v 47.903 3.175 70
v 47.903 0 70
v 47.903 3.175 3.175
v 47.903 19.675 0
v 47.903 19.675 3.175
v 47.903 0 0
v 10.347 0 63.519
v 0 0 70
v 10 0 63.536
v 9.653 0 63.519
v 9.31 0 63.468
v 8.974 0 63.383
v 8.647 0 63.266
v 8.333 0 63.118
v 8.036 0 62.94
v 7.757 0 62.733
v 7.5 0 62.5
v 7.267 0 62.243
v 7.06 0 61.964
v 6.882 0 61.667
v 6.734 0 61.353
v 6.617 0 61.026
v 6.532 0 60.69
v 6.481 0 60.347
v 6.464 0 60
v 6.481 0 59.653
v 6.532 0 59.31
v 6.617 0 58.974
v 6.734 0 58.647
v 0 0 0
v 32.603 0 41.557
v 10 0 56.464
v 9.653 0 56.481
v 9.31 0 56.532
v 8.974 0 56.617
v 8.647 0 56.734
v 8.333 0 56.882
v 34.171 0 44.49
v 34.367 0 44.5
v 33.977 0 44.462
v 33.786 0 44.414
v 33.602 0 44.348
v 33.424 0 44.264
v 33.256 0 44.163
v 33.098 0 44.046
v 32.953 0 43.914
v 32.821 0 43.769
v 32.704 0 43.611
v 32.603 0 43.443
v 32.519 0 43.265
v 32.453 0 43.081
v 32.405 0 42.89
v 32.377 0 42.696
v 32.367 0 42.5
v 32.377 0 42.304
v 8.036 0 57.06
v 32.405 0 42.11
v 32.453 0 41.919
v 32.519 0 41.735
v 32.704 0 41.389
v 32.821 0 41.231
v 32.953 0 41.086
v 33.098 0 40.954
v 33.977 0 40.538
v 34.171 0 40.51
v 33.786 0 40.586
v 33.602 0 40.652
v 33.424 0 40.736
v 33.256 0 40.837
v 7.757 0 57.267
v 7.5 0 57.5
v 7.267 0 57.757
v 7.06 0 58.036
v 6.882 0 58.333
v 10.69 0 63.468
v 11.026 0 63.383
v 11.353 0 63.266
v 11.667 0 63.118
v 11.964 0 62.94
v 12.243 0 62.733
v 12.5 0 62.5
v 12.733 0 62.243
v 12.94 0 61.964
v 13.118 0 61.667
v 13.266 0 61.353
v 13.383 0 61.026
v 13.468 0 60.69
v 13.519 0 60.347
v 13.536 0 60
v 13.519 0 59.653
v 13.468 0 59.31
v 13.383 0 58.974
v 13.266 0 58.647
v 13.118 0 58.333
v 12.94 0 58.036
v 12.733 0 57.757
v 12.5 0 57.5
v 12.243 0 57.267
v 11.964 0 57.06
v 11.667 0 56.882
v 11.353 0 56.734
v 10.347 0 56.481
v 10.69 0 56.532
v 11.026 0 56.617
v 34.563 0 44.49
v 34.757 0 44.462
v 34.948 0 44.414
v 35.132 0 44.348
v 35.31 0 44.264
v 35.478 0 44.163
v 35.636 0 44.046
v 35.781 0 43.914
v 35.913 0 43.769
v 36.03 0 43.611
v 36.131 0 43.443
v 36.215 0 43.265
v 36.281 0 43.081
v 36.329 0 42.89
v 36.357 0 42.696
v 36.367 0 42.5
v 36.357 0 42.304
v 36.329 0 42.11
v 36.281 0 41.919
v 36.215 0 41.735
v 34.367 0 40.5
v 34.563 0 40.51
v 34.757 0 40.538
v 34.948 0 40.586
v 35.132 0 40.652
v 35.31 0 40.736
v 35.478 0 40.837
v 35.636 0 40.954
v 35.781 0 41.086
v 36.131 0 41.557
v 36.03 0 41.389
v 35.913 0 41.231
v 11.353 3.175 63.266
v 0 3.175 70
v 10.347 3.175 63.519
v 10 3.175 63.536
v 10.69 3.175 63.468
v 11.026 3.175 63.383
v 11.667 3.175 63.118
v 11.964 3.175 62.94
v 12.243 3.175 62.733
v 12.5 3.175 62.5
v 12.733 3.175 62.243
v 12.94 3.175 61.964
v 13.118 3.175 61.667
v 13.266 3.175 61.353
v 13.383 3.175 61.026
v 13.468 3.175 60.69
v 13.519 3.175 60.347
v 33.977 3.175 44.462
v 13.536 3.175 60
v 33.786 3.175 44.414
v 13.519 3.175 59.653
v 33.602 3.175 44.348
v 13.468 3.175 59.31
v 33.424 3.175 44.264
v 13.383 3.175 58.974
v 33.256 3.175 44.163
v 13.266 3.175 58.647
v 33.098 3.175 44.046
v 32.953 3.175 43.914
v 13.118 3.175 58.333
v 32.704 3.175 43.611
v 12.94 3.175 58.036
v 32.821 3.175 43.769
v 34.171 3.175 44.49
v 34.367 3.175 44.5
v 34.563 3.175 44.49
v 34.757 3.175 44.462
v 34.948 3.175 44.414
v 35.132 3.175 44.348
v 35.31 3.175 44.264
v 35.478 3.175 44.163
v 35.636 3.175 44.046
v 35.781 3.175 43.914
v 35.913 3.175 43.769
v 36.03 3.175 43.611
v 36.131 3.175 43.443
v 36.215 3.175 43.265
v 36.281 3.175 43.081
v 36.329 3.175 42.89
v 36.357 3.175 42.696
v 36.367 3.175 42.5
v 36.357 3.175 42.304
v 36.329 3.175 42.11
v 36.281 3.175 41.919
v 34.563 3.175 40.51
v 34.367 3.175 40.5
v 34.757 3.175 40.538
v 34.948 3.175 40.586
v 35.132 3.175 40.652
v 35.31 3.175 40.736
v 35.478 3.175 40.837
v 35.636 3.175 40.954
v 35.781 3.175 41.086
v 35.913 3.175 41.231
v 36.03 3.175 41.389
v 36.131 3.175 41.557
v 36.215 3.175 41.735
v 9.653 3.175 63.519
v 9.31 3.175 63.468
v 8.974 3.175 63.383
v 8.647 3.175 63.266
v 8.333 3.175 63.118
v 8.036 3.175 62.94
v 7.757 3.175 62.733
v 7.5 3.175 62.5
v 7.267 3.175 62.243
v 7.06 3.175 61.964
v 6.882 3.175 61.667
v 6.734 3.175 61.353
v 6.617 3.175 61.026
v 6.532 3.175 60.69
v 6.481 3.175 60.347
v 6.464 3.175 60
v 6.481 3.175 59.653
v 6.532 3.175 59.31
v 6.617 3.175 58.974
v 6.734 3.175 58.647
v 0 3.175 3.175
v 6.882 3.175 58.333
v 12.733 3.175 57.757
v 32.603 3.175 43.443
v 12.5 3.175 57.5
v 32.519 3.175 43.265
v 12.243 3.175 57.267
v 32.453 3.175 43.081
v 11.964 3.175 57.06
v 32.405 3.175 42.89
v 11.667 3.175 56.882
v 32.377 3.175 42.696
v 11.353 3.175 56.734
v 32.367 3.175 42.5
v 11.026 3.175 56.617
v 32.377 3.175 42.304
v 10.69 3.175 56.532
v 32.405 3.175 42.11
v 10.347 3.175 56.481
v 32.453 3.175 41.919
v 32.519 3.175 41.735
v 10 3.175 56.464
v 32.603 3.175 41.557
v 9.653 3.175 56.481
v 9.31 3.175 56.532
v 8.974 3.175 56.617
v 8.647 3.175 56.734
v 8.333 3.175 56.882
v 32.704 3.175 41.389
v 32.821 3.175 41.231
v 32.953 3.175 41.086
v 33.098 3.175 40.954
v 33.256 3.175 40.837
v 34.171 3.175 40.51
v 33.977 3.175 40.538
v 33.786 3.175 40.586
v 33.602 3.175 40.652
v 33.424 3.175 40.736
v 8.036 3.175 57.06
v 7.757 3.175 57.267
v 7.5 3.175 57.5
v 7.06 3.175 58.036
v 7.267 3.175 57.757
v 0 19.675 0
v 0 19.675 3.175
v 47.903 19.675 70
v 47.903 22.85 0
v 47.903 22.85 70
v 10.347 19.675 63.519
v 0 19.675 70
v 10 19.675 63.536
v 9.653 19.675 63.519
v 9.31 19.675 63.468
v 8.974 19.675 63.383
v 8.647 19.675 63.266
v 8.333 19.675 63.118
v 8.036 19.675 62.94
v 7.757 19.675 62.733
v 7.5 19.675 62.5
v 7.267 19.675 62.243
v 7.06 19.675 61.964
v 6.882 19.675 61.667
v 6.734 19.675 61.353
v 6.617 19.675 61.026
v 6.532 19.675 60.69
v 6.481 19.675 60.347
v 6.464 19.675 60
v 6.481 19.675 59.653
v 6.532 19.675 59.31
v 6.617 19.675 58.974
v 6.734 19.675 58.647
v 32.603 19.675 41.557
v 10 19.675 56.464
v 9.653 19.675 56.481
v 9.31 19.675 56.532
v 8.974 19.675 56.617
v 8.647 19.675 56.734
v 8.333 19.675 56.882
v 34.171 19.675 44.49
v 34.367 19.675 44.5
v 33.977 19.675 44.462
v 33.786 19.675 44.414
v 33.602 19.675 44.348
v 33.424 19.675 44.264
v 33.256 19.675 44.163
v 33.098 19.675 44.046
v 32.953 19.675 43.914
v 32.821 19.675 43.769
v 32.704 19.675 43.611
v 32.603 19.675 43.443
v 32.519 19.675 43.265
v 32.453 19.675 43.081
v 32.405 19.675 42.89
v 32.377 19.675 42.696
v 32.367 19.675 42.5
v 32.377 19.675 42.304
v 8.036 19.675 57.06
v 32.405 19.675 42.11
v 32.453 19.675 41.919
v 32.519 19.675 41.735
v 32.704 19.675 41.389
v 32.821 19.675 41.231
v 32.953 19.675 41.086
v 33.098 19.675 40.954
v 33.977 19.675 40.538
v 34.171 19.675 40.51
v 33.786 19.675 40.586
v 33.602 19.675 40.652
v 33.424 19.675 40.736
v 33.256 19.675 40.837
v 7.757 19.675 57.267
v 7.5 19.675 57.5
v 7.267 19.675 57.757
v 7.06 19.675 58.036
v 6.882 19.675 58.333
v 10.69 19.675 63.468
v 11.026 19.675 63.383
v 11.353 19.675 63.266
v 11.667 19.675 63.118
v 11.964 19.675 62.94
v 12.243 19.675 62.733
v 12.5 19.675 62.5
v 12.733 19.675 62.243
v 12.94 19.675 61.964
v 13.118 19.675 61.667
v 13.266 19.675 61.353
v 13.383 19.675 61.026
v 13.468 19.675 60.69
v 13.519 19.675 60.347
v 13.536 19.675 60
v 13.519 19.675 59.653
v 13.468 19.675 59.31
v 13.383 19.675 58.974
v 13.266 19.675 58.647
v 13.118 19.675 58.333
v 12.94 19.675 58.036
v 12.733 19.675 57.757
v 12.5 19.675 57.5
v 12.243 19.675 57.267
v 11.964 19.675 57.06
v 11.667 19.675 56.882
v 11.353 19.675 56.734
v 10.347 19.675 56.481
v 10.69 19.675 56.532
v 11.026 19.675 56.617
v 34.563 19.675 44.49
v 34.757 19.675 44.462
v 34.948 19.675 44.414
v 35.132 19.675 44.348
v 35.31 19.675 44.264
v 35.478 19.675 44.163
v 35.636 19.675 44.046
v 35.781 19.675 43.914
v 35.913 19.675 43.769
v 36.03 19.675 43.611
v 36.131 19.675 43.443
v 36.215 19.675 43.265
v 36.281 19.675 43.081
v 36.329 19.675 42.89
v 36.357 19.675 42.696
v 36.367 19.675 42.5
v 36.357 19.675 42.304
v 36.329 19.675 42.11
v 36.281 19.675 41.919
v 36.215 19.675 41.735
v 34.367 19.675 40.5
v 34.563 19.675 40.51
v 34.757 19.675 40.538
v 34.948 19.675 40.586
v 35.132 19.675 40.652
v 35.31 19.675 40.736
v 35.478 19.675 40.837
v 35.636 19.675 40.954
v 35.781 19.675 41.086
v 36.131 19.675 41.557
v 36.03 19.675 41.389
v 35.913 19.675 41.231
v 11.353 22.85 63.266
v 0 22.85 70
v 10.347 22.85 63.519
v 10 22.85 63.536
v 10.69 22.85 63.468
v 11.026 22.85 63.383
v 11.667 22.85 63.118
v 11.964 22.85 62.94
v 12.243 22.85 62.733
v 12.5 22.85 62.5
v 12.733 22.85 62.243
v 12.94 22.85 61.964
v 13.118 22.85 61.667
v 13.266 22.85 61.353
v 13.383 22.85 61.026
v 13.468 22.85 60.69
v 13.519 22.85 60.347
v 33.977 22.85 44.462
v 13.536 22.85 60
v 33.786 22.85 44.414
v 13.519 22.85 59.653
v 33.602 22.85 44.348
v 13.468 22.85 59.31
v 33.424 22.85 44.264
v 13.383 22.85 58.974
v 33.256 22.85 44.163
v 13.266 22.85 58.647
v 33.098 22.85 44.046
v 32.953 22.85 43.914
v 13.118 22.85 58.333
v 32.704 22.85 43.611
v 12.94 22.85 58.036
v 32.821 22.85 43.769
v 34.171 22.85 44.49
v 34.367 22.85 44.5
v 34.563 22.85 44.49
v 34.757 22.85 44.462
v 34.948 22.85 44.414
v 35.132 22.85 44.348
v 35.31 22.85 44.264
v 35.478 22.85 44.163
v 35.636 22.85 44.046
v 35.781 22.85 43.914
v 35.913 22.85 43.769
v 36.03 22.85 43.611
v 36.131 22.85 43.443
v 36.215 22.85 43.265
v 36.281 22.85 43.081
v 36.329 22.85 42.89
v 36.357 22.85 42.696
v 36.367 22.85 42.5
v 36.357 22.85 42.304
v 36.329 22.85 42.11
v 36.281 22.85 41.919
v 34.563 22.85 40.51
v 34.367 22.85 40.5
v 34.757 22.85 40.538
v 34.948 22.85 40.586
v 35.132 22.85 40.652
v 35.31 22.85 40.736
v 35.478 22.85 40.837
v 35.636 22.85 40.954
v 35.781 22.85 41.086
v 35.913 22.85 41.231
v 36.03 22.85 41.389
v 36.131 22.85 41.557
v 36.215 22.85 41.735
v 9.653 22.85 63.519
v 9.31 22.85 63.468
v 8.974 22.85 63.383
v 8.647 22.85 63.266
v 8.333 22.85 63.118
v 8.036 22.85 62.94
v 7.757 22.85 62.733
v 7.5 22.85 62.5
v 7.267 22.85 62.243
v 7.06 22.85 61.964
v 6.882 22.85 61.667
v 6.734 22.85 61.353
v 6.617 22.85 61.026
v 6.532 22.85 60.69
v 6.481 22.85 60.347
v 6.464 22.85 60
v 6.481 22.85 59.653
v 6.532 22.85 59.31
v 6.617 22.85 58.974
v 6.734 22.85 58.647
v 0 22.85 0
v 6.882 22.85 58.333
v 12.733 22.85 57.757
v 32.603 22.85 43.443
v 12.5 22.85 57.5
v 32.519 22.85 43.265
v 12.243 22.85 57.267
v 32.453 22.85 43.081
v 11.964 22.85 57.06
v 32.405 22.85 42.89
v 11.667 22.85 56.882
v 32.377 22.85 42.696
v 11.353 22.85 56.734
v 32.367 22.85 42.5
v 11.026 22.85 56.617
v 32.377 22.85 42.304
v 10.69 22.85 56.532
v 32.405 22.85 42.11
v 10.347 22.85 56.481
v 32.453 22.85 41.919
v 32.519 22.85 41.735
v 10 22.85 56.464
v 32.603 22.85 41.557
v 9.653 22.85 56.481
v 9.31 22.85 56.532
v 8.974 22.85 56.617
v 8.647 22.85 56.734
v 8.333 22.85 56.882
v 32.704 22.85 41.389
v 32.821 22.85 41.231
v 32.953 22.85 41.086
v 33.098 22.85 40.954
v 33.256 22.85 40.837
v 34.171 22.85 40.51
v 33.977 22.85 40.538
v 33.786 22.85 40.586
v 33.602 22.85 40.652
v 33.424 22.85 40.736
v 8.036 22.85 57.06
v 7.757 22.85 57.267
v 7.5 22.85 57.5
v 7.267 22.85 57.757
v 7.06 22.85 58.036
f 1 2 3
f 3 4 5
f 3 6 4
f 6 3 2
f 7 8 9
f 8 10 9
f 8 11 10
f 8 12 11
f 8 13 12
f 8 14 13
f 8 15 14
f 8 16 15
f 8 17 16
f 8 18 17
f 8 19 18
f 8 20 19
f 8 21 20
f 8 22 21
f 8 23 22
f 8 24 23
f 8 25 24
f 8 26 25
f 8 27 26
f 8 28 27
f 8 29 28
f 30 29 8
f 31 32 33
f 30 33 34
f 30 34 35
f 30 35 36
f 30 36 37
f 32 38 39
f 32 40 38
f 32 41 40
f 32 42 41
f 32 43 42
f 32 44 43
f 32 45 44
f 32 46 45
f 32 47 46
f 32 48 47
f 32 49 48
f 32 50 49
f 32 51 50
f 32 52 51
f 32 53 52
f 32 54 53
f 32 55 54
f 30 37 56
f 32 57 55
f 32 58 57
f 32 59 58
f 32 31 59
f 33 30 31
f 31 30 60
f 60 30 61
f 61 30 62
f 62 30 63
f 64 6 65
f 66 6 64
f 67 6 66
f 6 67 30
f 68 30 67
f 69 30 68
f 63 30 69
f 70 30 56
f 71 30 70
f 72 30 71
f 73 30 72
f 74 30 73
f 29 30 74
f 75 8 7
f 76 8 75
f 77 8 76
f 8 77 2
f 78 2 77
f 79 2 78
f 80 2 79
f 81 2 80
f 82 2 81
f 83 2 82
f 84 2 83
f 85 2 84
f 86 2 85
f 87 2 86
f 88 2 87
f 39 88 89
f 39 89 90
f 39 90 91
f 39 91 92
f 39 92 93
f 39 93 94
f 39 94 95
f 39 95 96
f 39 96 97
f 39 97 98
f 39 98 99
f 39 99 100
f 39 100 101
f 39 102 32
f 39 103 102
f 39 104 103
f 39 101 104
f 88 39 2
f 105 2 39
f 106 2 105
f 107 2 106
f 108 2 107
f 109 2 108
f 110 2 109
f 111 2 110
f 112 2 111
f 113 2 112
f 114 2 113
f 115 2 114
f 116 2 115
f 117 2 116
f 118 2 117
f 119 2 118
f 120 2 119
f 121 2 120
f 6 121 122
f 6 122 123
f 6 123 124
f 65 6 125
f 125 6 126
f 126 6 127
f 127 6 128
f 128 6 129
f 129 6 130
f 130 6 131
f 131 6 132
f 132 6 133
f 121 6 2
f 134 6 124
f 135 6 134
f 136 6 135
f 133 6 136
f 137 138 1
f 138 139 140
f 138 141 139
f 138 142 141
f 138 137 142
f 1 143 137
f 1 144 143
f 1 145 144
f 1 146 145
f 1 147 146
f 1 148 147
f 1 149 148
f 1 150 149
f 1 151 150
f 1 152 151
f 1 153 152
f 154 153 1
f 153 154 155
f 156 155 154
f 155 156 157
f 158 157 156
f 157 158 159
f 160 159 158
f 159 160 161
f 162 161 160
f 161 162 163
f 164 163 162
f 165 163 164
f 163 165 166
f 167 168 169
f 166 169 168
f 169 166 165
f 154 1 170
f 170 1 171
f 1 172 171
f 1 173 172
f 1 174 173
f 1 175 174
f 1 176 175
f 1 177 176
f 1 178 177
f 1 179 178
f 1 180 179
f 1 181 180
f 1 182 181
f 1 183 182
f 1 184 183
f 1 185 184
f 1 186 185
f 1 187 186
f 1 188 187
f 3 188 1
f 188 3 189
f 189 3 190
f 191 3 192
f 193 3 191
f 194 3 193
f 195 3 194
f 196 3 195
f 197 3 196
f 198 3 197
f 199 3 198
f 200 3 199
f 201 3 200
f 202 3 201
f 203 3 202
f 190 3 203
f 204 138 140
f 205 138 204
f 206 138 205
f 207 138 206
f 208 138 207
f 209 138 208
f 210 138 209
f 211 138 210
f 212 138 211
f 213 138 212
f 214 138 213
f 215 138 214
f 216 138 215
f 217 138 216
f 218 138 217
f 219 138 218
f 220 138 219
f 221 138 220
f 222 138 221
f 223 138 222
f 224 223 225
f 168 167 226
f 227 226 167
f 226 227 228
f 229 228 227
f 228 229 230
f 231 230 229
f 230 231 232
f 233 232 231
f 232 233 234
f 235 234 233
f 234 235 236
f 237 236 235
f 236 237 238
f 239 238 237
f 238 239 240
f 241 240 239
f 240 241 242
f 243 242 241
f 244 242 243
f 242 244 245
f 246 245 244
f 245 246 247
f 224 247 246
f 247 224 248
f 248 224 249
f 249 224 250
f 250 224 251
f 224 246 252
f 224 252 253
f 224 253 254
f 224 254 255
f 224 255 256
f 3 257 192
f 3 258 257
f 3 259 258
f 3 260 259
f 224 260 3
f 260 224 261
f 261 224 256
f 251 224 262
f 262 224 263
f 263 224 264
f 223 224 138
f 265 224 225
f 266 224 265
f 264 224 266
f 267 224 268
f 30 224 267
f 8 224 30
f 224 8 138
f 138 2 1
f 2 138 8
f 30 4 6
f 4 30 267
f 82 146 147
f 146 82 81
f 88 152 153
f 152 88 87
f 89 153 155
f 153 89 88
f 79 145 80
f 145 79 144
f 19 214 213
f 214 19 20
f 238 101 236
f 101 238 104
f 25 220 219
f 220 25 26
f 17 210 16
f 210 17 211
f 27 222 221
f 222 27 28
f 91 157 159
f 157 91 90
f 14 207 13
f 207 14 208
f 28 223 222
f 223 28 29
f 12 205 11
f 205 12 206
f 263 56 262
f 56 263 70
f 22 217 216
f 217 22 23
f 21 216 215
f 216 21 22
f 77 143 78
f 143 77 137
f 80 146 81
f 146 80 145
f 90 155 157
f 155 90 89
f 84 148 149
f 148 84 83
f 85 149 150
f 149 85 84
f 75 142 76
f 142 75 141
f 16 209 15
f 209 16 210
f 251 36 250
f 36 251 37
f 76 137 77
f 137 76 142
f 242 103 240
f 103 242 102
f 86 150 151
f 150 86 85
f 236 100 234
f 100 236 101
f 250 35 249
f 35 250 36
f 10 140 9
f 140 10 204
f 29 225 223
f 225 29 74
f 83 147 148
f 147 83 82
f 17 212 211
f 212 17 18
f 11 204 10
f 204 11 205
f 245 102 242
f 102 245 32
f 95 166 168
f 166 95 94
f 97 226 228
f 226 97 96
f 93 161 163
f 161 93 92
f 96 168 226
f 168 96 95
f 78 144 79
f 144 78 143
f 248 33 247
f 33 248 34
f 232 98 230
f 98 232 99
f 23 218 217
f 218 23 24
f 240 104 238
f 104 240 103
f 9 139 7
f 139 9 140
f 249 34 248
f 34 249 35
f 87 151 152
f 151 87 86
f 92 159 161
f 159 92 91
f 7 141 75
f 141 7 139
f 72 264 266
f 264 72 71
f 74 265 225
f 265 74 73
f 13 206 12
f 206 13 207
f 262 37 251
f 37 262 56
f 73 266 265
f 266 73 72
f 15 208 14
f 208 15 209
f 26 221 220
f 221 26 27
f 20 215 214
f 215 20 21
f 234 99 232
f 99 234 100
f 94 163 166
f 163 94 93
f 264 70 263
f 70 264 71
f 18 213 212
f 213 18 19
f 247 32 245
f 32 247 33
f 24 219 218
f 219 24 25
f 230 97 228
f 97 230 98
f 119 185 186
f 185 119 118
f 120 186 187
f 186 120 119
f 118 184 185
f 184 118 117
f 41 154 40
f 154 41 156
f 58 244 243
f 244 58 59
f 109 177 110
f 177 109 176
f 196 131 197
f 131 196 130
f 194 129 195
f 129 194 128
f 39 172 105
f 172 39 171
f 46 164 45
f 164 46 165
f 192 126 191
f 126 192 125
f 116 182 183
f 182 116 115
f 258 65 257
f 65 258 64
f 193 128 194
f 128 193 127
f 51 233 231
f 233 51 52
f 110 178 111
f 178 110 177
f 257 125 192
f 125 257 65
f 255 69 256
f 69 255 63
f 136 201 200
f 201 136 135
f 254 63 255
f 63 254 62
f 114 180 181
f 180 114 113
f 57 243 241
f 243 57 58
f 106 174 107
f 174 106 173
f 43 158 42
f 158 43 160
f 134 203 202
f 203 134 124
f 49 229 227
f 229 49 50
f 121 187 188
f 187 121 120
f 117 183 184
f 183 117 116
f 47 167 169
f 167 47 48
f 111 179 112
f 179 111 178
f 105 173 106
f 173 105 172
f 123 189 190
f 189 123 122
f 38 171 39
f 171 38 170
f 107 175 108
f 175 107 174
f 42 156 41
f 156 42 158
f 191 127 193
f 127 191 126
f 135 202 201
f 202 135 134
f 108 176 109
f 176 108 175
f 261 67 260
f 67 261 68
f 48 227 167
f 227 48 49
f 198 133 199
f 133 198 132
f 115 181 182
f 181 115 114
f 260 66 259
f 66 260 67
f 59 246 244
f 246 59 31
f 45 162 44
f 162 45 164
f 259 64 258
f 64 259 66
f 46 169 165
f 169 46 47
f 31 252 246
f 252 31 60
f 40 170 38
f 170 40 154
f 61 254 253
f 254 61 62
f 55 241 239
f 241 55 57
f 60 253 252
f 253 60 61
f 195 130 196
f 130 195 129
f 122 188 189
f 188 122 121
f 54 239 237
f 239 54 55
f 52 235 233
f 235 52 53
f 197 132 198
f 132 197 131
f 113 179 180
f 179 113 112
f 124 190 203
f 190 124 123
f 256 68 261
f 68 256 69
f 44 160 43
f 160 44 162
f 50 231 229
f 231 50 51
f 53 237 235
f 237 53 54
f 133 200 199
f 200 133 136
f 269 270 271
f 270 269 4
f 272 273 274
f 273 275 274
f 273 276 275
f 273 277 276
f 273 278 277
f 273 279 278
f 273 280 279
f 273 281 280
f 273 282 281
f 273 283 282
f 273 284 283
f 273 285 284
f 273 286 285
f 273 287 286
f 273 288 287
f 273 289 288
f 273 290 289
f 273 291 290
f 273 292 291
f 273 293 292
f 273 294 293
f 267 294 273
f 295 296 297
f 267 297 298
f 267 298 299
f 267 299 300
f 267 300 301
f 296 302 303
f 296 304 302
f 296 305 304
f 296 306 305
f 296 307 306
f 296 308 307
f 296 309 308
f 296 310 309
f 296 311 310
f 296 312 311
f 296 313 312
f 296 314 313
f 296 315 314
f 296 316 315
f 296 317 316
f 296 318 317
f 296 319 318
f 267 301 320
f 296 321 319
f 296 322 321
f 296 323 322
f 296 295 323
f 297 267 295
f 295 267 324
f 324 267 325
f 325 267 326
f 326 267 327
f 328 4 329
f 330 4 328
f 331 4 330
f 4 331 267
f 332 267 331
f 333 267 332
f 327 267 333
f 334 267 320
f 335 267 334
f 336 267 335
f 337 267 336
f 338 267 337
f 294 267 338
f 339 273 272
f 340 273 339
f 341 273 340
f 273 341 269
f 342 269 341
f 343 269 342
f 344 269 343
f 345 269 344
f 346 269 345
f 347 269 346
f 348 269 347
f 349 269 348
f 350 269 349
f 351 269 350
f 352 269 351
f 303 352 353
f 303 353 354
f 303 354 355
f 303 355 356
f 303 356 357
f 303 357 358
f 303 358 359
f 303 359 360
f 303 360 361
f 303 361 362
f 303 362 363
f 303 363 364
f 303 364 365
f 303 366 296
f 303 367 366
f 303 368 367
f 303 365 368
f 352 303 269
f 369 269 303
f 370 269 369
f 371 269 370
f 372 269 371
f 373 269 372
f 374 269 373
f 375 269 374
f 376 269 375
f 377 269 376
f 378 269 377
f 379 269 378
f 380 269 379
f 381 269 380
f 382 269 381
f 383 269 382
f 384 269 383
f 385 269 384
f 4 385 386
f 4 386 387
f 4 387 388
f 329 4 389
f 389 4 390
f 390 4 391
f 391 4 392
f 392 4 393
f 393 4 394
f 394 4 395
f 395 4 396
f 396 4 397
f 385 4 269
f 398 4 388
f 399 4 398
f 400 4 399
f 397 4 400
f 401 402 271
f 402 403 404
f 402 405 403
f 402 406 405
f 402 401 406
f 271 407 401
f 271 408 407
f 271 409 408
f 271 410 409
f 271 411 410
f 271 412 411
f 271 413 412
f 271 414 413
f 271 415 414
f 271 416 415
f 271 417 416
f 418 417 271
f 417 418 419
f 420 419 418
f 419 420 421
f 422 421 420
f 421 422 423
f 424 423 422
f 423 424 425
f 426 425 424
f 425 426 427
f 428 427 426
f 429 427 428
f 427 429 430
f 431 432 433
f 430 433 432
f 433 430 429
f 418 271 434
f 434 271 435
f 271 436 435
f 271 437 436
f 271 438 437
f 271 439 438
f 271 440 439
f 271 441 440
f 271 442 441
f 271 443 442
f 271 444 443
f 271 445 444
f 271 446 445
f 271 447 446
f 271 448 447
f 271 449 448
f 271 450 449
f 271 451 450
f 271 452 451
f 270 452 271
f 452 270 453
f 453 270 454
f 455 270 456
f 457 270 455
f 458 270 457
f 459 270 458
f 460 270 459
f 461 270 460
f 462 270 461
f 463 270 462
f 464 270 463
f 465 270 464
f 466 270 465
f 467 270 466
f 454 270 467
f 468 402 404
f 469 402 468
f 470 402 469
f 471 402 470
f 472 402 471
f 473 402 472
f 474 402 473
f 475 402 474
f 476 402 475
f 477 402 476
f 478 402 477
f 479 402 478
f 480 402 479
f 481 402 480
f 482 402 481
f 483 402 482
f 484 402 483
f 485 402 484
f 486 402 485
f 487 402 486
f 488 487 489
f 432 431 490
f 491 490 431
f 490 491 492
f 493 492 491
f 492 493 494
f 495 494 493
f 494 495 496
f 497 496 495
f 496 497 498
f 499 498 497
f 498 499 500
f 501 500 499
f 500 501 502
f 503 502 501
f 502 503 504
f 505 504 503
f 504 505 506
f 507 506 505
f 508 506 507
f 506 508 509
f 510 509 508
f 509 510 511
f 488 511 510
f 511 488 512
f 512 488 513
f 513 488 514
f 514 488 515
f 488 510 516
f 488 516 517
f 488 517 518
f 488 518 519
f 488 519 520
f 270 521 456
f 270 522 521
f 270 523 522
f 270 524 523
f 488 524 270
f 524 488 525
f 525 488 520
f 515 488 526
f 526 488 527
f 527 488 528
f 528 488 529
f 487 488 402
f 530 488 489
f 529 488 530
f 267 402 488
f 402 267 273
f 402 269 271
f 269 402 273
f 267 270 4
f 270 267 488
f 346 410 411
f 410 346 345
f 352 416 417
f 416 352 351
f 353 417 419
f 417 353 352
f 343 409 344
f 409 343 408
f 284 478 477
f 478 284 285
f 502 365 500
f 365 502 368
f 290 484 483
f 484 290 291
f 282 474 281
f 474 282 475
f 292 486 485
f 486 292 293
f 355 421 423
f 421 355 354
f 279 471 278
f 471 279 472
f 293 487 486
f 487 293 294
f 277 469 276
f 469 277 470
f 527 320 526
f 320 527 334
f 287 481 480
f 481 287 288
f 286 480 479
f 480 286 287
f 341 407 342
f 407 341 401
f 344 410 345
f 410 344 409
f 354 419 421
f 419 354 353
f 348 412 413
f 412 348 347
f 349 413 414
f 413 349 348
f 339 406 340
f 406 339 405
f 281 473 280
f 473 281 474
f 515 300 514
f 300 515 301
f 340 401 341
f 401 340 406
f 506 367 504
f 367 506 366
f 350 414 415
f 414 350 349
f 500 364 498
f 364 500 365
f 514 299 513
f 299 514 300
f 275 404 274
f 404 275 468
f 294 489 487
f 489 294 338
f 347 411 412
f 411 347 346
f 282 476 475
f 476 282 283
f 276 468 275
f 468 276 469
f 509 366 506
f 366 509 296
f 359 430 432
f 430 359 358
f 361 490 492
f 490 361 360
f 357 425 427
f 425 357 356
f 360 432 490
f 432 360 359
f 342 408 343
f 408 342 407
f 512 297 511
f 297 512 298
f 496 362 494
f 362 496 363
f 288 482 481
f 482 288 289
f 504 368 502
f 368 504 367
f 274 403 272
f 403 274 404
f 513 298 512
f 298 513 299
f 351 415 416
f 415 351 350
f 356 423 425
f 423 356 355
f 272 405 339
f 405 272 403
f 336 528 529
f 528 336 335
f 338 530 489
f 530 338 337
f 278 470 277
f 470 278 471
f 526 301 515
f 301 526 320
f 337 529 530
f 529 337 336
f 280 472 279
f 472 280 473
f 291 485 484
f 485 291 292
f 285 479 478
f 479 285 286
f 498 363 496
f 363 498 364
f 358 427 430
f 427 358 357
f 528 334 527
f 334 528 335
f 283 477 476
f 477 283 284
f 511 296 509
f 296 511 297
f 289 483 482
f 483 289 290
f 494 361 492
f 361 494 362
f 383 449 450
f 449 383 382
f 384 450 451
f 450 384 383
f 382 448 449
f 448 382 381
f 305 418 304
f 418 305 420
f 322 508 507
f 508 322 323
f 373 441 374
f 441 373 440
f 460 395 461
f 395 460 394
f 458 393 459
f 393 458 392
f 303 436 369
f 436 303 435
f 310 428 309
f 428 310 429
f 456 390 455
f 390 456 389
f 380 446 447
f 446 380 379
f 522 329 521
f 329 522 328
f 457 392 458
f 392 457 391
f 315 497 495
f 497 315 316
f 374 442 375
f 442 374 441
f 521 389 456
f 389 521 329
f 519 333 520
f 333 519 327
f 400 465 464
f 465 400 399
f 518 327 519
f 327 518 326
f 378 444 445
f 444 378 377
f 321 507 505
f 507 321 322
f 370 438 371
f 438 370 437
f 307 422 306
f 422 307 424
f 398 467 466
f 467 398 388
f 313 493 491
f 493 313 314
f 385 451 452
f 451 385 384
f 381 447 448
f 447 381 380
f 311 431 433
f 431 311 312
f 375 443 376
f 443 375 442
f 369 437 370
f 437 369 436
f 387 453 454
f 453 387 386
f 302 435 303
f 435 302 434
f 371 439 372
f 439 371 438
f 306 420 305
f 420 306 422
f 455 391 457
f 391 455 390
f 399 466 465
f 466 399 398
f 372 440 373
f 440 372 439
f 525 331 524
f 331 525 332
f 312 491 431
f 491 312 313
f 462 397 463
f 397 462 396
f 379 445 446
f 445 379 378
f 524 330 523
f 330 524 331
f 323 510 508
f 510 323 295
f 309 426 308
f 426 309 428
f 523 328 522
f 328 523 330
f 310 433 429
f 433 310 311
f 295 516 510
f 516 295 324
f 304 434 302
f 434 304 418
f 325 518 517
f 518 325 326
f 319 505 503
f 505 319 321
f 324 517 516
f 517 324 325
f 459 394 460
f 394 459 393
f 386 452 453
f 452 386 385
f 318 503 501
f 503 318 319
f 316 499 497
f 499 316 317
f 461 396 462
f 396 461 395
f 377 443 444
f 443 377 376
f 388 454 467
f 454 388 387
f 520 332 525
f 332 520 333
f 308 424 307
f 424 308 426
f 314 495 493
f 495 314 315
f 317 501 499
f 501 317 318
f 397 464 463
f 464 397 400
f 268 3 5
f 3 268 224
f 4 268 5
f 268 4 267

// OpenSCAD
$fn = 64;

mm = 1;
cm = 10*mm;
in = 25.4*mm;

module rotate_around_xy(deg, x, y) {
    translate([x,y,0])
    rotate([0,0,deg])
    translate([-x,-y, 0]) {
        children();
    }
}

REFERENCE = 100*cm;

ACRYLIC_THICKNESS = 1*in / 8;
THREAD_COUNT = 4;
THREAD_SEPARATION = 4*mm;

CAM_AXLE_SQUARE_SIDE = 5*mm;
CAM_AXLE_DIAMETER = sqrt(2)*CAM_AXLE_SQUARE_SIDE;
CAM_RESET_FRACTION = 1/4;
CAM_DROP_FRACTION = 1 - CAM_RESET_FRACTION;
CAM_DROP_LENGTH = (THREAD_COUNT - 1)*THREAD_SEPARATION;
// circumference = 2*pi*r = cam_drop_length * 1/cam_drop_fraction
// r = (cam_drop_length / cam_drop_fraction) / (2*pi)
//   = cam_drop_length / (2 * pi * cam_drop_fraction)
BASE_CAM_RADIUS = max(1*cm, CAM_DROP_LENGTH / (2 * PI * CAM_DROP_FRACTION));
CAM_THICKNESS = ACRYLIC_THICKNESS;
CAM_LIFT = 1.5*cm;
CAM_LIFT_HEIGHT = CAM_LIFT + BASE_CAM_RADIUS;

TRIP_LEVER_INNER_RADIUS = CAM_LIFT_HEIGHT;
TRIP_LEVER_RADIUS_DELTA = 1*cm;
TRIP_LEVER_OUTER_RADIUS = TRIP_LEVER_INNER_RADIUS + TRIP_LEVER_RADIUS_DELTA;
TRIP_LEVER_THICKNESS = ACRYLIC_THICKNESS;
/*
    y = clh + cl/2
    clh^2 = x^2 + y^2
    clh^2 - y^2 = x^2
    sqrt(clh^2 - y^2) = x 
*/
TRIP_LEVER_PIVOT_Y = -(BASE_CAM_RADIUS + 0.5 * CAM_LIFT);
TRIP_LEVER_PIVOT_X = sqrt((CAM_LIFT_HEIGHT+0.5*TRIP_LEVER_RADIUS_DELTA)^2 - TRIP_LEVER_PIVOT_Y^2);
TRIP_LEVER_PIVOT_ANGLE = atan(TRIP_LEVER_PIVOT_X/-TRIP_LEVER_PIVOT_Y);
TRIP_LEVER_LIFT_ARM_HEIGHT = TRIP_LEVER_RADIUS_DELTA;
TRIP_LEVER_LIFT_ARM_LENGTH = TRIP_LEVER_PIVOT_X;
TRIP_LEVER_AXLE_RADIUS = 2*mm;

FRAME_SIDE_HEIGHT = 7*cm;
FRAME_SIDE_WIDTH = (TRIP_LEVER_PIVOT_X+2*cm+CAM_AXLE_DIAMETER/2);
FRAME_SIDE_THICKNESS = ACRYLIC_THICKNESS;

PAPER_THICKNESS = 0.1*mm;
SEGMENT_SIZE = CAM_THICKNESS + 2*PAPER_THICKNESS;
SEGMENT_SEPARATOR_SIZE = 1*mm;

FRAME_BASE_WIDTH = FRAME_SIDE_WIDTH;
FRAME_BASE_LENGTH = THREAD_COUNT*SEGMENT_SIZE + (THREAD_COUNT-1)*SEGMENT_SEPARATOR_SIZE;
FRAME_BASE_THICKNESS = ACRYLIC_THICKNESS;


module cam_axle_square_hole() {
    cube([CAM_AXLE_SQUARE_SIDE, CAM_AXLE_SQUARE_SIDE, REFERENCE], center = true);
}

module cam_axle_round_hole() {
    translate([0,0,-REFERENCE/2])
    cylinder(d = CAM_AXLE_DIAMETER, h = REFERENCE);
}

module trip_lever_axle_hole() {
    translate([0,0,-REFERENCE/2])
    cylinder(r = TRIP_LEVER_AXLE_RADIUS, h = REFERENCE);
}


module reference_drop_positions() {
    for (i = [0:THREAD_COUNT-1]) {
        rotate([0,0,360*i/(THREAD_COUNT/CAM_DROP_FRACTION)])
        translate([-THREAD_SEPARATION,0,0])
        %cube([THREAD_SEPARATION,REFERENCE,2]);
    }
}

module sector(r,h,deg) {
    if (0 <= deg && deg <= 180) {
        intersection() {
            cylinder(r = r, h = h);

            translate([-2*r, 0, -2*r])
            cube([4*r, 4*r, 4*r]);

            rotate([0,0,deg])
            translate([-2*r, -4*r, -2*r])
            cube([4*r, 4*r, 4*r]);
        }
    } else {
        intersection() {
            cylinder(r = r, h = h);

            union() {
                translate([-2*r, 0, -2*r])
                cube([4*r, 4*r, 4*r]);

                rotate([0,0,deg])
                translate([-2*r, -4*r, -2*r])
                cube([4*r, 4*r, 4*r]);
            }
        }
    }
}

module base_cam_disk() {
    cylinder(r = BASE_CAM_RADIUS, h = CAM_THICKNESS);
}

module cam_lift_segment() {
    intersection() {
        scale([1,CAM_LIFT_HEIGHT/BASE_CAM_RADIUS,1])
        base_cam_disk();

        translate([0,0,-REFERENCE/2])
        cube([REFERENCE, REFERENCE, REFERENCE]);
    }
}

module cam_drop_segment(i) {
    // s = CAM_LIFT_HEIGHT/BASE_CAM_RADIUS;
    theta = 270*i/(THREAD_COUNT-1);
    rotate([0,0,90])
    sector(CAM_LIFT_HEIGHT, CAM_THICKNESS, theta);
    // difference() {
    //     scale([s,s,1])
    //     base_cam_disk();

    //     if (theta <= 180) {
    //         translate([0,-REFERENCE/2,-REFERENCE/2])
    //         cube([REFERENCE, REFERENCE, REFERENCE]);

    //         rotate([0,0,theta])
    //         translate([-REFERENCE,-REFERENCE/2,-REFERENCE/2])
    //         cube([REFERENCE, REFERENCE, REFERENCE]);
    //     } else {
    //         translate([0,0,-REFERENCE/2])
    //         cube([REFERENCE, REFERENCE, REFERENCE]);

    //         rotate([0,0,theta-180])
    //         translate([0,-REFERENCE,-REFERENCE/2])
    //         cube([REFERENCE, REFERENCE, REFERENCE]);
    //     }
    // }
}

module cam(i) {
    difference() {
        union() {
            base_cam_disk();
            cam_lift_segment();
            cam_drop_segment(i);
        }
        cam_axle_square_hole();
    }
}

module trip_lever() {
    difference() {
        union() {
            translate([TRIP_LEVER_PIVOT_X,TRIP_LEVER_PIVOT_Y-0.5*TRIP_LEVER_LIFT_ARM_HEIGHT,0])
            cube([TRIP_LEVER_LIFT_ARM_LENGTH, TRIP_LEVER_LIFT_ARM_HEIGHT, TRIP_LEVER_THICKNESS]);

            translate([TRIP_LEVER_PIVOT_X,TRIP_LEVER_PIVOT_Y,0])
            cylinder(d = TRIP_LEVER_LIFT_ARM_HEIGHT, h = TRIP_LEVER_THICKNESS);
            

            translate([TRIP_LEVER_PIVOT_X,-CAM_LIFT_HEIGHT-0.5*TRIP_LEVER_LIFT_ARM_HEIGHT,0])
            cylinder(d = TRIP_LEVER_LIFT_ARM_HEIGHT, h = TRIP_LEVER_THICKNESS);

            h = CAM_LIFT_HEIGHT+TRIP_LEVER_PIVOT_Y + 0.5*TRIP_LEVER_LIFT_ARM_HEIGHT;
            translate([TRIP_LEVER_PIVOT_X-0.5*TRIP_LEVER_LIFT_ARM_HEIGHT,
                       -h+TRIP_LEVER_PIVOT_Y,
                       0])
            cube([TRIP_LEVER_LIFT_ARM_HEIGHT, h, TRIP_LEVER_THICKNESS]);
            
            difference() {
                translate([0,-TRIP_LEVER_LIFT_ARM_HEIGHT-CAM_LIFT_HEIGHT,0])
                cube([TRIP_LEVER_PIVOT_X, TRIP_LEVER_LIFT_ARM_HEIGHT, TRIP_LEVER_THICKNESS]);
            //     cylinder(r = TRIP_LEVER_OUTER_RADIUS, h = TRIP_LEVER_THICKNESS);

            //     translate([0,0,-REFERENCE/2])
            //     cylinder(r = TRIP_LEVER_INNER_RADIUS, h = REFERENCE);

            //     translate([-REFERENCE,-REFERENCE/2,-REFERENCE/2])
            //     cube([REFERENCE, REFERENCE, REFERENCE]);

            //     rotate([0,0,TRIP_LEVER_PIVOT_ANGLE])
            //     translate([0,-REFERENCE/2,-REFERENCE/2])
            //     cube([REFERENCE, REFERENCE, REFERENCE]);
                
                translate([0,-TRIP_LEVER_INNER_RADIUS,-10])
                rotate([0,0,-135])
                cube([20,20,20]);

            }
        }
        translate([TRIP_LEVER_PIVOT_X, TRIP_LEVER_PIVOT_Y, 0])
        trip_lever_axle_hole();
    }
}

module frame_side() {
    translate([0,FRAME_SIDE_THICKNESS,0])
    rotate([90,0,0])
    translate([1*cm,FRAME_SIDE_HEIGHT-1*cm,0])
    difference() {
        translate([-1*cm,1*cm-FRAME_SIDE_HEIGHT,0])
        cube([FRAME_SIDE_WIDTH, FRAME_SIDE_HEIGHT, FRAME_SIDE_THICKNESS]);
        
        cam_axle_round_hole();

        translate([TRIP_LEVER_PIVOT_X, TRIP_LEVER_PIVOT_Y, 0])
        trip_lever_axle_hole();

        // translate([1.4*cm,0,0])
        // rotate([0,0,-45])
        // translate([-REFERENCE/2,0,-REFERENCE/2])
        // cube([REFERENCE, REFERENCE, REFERENCE]);
    }
}

module frame_base() {
    cube([FRAME_BASE_WIDTH, FRAME_BASE_LENGTH, FRAME_BASE_THICKNESS]);
}

module frame() {
    frame_side();
    
    translate([0,ACRYLIC_THICKNESS,0])
    frame_base();

    translate([0,ACRYLIC_THICKNESS+FRAME_BASE_LENGTH,0])
    frame_side();
}

// rotate_around_xy(-140, 0, 0)
// cam(20);

// projection()
// rotate_around_xy(-15, TRIP_LEVER_PIVOT_X, TRIP_LEVER_PIVOT_Y)
// trip_lever();

// projection()
// frame_side();
frame();
